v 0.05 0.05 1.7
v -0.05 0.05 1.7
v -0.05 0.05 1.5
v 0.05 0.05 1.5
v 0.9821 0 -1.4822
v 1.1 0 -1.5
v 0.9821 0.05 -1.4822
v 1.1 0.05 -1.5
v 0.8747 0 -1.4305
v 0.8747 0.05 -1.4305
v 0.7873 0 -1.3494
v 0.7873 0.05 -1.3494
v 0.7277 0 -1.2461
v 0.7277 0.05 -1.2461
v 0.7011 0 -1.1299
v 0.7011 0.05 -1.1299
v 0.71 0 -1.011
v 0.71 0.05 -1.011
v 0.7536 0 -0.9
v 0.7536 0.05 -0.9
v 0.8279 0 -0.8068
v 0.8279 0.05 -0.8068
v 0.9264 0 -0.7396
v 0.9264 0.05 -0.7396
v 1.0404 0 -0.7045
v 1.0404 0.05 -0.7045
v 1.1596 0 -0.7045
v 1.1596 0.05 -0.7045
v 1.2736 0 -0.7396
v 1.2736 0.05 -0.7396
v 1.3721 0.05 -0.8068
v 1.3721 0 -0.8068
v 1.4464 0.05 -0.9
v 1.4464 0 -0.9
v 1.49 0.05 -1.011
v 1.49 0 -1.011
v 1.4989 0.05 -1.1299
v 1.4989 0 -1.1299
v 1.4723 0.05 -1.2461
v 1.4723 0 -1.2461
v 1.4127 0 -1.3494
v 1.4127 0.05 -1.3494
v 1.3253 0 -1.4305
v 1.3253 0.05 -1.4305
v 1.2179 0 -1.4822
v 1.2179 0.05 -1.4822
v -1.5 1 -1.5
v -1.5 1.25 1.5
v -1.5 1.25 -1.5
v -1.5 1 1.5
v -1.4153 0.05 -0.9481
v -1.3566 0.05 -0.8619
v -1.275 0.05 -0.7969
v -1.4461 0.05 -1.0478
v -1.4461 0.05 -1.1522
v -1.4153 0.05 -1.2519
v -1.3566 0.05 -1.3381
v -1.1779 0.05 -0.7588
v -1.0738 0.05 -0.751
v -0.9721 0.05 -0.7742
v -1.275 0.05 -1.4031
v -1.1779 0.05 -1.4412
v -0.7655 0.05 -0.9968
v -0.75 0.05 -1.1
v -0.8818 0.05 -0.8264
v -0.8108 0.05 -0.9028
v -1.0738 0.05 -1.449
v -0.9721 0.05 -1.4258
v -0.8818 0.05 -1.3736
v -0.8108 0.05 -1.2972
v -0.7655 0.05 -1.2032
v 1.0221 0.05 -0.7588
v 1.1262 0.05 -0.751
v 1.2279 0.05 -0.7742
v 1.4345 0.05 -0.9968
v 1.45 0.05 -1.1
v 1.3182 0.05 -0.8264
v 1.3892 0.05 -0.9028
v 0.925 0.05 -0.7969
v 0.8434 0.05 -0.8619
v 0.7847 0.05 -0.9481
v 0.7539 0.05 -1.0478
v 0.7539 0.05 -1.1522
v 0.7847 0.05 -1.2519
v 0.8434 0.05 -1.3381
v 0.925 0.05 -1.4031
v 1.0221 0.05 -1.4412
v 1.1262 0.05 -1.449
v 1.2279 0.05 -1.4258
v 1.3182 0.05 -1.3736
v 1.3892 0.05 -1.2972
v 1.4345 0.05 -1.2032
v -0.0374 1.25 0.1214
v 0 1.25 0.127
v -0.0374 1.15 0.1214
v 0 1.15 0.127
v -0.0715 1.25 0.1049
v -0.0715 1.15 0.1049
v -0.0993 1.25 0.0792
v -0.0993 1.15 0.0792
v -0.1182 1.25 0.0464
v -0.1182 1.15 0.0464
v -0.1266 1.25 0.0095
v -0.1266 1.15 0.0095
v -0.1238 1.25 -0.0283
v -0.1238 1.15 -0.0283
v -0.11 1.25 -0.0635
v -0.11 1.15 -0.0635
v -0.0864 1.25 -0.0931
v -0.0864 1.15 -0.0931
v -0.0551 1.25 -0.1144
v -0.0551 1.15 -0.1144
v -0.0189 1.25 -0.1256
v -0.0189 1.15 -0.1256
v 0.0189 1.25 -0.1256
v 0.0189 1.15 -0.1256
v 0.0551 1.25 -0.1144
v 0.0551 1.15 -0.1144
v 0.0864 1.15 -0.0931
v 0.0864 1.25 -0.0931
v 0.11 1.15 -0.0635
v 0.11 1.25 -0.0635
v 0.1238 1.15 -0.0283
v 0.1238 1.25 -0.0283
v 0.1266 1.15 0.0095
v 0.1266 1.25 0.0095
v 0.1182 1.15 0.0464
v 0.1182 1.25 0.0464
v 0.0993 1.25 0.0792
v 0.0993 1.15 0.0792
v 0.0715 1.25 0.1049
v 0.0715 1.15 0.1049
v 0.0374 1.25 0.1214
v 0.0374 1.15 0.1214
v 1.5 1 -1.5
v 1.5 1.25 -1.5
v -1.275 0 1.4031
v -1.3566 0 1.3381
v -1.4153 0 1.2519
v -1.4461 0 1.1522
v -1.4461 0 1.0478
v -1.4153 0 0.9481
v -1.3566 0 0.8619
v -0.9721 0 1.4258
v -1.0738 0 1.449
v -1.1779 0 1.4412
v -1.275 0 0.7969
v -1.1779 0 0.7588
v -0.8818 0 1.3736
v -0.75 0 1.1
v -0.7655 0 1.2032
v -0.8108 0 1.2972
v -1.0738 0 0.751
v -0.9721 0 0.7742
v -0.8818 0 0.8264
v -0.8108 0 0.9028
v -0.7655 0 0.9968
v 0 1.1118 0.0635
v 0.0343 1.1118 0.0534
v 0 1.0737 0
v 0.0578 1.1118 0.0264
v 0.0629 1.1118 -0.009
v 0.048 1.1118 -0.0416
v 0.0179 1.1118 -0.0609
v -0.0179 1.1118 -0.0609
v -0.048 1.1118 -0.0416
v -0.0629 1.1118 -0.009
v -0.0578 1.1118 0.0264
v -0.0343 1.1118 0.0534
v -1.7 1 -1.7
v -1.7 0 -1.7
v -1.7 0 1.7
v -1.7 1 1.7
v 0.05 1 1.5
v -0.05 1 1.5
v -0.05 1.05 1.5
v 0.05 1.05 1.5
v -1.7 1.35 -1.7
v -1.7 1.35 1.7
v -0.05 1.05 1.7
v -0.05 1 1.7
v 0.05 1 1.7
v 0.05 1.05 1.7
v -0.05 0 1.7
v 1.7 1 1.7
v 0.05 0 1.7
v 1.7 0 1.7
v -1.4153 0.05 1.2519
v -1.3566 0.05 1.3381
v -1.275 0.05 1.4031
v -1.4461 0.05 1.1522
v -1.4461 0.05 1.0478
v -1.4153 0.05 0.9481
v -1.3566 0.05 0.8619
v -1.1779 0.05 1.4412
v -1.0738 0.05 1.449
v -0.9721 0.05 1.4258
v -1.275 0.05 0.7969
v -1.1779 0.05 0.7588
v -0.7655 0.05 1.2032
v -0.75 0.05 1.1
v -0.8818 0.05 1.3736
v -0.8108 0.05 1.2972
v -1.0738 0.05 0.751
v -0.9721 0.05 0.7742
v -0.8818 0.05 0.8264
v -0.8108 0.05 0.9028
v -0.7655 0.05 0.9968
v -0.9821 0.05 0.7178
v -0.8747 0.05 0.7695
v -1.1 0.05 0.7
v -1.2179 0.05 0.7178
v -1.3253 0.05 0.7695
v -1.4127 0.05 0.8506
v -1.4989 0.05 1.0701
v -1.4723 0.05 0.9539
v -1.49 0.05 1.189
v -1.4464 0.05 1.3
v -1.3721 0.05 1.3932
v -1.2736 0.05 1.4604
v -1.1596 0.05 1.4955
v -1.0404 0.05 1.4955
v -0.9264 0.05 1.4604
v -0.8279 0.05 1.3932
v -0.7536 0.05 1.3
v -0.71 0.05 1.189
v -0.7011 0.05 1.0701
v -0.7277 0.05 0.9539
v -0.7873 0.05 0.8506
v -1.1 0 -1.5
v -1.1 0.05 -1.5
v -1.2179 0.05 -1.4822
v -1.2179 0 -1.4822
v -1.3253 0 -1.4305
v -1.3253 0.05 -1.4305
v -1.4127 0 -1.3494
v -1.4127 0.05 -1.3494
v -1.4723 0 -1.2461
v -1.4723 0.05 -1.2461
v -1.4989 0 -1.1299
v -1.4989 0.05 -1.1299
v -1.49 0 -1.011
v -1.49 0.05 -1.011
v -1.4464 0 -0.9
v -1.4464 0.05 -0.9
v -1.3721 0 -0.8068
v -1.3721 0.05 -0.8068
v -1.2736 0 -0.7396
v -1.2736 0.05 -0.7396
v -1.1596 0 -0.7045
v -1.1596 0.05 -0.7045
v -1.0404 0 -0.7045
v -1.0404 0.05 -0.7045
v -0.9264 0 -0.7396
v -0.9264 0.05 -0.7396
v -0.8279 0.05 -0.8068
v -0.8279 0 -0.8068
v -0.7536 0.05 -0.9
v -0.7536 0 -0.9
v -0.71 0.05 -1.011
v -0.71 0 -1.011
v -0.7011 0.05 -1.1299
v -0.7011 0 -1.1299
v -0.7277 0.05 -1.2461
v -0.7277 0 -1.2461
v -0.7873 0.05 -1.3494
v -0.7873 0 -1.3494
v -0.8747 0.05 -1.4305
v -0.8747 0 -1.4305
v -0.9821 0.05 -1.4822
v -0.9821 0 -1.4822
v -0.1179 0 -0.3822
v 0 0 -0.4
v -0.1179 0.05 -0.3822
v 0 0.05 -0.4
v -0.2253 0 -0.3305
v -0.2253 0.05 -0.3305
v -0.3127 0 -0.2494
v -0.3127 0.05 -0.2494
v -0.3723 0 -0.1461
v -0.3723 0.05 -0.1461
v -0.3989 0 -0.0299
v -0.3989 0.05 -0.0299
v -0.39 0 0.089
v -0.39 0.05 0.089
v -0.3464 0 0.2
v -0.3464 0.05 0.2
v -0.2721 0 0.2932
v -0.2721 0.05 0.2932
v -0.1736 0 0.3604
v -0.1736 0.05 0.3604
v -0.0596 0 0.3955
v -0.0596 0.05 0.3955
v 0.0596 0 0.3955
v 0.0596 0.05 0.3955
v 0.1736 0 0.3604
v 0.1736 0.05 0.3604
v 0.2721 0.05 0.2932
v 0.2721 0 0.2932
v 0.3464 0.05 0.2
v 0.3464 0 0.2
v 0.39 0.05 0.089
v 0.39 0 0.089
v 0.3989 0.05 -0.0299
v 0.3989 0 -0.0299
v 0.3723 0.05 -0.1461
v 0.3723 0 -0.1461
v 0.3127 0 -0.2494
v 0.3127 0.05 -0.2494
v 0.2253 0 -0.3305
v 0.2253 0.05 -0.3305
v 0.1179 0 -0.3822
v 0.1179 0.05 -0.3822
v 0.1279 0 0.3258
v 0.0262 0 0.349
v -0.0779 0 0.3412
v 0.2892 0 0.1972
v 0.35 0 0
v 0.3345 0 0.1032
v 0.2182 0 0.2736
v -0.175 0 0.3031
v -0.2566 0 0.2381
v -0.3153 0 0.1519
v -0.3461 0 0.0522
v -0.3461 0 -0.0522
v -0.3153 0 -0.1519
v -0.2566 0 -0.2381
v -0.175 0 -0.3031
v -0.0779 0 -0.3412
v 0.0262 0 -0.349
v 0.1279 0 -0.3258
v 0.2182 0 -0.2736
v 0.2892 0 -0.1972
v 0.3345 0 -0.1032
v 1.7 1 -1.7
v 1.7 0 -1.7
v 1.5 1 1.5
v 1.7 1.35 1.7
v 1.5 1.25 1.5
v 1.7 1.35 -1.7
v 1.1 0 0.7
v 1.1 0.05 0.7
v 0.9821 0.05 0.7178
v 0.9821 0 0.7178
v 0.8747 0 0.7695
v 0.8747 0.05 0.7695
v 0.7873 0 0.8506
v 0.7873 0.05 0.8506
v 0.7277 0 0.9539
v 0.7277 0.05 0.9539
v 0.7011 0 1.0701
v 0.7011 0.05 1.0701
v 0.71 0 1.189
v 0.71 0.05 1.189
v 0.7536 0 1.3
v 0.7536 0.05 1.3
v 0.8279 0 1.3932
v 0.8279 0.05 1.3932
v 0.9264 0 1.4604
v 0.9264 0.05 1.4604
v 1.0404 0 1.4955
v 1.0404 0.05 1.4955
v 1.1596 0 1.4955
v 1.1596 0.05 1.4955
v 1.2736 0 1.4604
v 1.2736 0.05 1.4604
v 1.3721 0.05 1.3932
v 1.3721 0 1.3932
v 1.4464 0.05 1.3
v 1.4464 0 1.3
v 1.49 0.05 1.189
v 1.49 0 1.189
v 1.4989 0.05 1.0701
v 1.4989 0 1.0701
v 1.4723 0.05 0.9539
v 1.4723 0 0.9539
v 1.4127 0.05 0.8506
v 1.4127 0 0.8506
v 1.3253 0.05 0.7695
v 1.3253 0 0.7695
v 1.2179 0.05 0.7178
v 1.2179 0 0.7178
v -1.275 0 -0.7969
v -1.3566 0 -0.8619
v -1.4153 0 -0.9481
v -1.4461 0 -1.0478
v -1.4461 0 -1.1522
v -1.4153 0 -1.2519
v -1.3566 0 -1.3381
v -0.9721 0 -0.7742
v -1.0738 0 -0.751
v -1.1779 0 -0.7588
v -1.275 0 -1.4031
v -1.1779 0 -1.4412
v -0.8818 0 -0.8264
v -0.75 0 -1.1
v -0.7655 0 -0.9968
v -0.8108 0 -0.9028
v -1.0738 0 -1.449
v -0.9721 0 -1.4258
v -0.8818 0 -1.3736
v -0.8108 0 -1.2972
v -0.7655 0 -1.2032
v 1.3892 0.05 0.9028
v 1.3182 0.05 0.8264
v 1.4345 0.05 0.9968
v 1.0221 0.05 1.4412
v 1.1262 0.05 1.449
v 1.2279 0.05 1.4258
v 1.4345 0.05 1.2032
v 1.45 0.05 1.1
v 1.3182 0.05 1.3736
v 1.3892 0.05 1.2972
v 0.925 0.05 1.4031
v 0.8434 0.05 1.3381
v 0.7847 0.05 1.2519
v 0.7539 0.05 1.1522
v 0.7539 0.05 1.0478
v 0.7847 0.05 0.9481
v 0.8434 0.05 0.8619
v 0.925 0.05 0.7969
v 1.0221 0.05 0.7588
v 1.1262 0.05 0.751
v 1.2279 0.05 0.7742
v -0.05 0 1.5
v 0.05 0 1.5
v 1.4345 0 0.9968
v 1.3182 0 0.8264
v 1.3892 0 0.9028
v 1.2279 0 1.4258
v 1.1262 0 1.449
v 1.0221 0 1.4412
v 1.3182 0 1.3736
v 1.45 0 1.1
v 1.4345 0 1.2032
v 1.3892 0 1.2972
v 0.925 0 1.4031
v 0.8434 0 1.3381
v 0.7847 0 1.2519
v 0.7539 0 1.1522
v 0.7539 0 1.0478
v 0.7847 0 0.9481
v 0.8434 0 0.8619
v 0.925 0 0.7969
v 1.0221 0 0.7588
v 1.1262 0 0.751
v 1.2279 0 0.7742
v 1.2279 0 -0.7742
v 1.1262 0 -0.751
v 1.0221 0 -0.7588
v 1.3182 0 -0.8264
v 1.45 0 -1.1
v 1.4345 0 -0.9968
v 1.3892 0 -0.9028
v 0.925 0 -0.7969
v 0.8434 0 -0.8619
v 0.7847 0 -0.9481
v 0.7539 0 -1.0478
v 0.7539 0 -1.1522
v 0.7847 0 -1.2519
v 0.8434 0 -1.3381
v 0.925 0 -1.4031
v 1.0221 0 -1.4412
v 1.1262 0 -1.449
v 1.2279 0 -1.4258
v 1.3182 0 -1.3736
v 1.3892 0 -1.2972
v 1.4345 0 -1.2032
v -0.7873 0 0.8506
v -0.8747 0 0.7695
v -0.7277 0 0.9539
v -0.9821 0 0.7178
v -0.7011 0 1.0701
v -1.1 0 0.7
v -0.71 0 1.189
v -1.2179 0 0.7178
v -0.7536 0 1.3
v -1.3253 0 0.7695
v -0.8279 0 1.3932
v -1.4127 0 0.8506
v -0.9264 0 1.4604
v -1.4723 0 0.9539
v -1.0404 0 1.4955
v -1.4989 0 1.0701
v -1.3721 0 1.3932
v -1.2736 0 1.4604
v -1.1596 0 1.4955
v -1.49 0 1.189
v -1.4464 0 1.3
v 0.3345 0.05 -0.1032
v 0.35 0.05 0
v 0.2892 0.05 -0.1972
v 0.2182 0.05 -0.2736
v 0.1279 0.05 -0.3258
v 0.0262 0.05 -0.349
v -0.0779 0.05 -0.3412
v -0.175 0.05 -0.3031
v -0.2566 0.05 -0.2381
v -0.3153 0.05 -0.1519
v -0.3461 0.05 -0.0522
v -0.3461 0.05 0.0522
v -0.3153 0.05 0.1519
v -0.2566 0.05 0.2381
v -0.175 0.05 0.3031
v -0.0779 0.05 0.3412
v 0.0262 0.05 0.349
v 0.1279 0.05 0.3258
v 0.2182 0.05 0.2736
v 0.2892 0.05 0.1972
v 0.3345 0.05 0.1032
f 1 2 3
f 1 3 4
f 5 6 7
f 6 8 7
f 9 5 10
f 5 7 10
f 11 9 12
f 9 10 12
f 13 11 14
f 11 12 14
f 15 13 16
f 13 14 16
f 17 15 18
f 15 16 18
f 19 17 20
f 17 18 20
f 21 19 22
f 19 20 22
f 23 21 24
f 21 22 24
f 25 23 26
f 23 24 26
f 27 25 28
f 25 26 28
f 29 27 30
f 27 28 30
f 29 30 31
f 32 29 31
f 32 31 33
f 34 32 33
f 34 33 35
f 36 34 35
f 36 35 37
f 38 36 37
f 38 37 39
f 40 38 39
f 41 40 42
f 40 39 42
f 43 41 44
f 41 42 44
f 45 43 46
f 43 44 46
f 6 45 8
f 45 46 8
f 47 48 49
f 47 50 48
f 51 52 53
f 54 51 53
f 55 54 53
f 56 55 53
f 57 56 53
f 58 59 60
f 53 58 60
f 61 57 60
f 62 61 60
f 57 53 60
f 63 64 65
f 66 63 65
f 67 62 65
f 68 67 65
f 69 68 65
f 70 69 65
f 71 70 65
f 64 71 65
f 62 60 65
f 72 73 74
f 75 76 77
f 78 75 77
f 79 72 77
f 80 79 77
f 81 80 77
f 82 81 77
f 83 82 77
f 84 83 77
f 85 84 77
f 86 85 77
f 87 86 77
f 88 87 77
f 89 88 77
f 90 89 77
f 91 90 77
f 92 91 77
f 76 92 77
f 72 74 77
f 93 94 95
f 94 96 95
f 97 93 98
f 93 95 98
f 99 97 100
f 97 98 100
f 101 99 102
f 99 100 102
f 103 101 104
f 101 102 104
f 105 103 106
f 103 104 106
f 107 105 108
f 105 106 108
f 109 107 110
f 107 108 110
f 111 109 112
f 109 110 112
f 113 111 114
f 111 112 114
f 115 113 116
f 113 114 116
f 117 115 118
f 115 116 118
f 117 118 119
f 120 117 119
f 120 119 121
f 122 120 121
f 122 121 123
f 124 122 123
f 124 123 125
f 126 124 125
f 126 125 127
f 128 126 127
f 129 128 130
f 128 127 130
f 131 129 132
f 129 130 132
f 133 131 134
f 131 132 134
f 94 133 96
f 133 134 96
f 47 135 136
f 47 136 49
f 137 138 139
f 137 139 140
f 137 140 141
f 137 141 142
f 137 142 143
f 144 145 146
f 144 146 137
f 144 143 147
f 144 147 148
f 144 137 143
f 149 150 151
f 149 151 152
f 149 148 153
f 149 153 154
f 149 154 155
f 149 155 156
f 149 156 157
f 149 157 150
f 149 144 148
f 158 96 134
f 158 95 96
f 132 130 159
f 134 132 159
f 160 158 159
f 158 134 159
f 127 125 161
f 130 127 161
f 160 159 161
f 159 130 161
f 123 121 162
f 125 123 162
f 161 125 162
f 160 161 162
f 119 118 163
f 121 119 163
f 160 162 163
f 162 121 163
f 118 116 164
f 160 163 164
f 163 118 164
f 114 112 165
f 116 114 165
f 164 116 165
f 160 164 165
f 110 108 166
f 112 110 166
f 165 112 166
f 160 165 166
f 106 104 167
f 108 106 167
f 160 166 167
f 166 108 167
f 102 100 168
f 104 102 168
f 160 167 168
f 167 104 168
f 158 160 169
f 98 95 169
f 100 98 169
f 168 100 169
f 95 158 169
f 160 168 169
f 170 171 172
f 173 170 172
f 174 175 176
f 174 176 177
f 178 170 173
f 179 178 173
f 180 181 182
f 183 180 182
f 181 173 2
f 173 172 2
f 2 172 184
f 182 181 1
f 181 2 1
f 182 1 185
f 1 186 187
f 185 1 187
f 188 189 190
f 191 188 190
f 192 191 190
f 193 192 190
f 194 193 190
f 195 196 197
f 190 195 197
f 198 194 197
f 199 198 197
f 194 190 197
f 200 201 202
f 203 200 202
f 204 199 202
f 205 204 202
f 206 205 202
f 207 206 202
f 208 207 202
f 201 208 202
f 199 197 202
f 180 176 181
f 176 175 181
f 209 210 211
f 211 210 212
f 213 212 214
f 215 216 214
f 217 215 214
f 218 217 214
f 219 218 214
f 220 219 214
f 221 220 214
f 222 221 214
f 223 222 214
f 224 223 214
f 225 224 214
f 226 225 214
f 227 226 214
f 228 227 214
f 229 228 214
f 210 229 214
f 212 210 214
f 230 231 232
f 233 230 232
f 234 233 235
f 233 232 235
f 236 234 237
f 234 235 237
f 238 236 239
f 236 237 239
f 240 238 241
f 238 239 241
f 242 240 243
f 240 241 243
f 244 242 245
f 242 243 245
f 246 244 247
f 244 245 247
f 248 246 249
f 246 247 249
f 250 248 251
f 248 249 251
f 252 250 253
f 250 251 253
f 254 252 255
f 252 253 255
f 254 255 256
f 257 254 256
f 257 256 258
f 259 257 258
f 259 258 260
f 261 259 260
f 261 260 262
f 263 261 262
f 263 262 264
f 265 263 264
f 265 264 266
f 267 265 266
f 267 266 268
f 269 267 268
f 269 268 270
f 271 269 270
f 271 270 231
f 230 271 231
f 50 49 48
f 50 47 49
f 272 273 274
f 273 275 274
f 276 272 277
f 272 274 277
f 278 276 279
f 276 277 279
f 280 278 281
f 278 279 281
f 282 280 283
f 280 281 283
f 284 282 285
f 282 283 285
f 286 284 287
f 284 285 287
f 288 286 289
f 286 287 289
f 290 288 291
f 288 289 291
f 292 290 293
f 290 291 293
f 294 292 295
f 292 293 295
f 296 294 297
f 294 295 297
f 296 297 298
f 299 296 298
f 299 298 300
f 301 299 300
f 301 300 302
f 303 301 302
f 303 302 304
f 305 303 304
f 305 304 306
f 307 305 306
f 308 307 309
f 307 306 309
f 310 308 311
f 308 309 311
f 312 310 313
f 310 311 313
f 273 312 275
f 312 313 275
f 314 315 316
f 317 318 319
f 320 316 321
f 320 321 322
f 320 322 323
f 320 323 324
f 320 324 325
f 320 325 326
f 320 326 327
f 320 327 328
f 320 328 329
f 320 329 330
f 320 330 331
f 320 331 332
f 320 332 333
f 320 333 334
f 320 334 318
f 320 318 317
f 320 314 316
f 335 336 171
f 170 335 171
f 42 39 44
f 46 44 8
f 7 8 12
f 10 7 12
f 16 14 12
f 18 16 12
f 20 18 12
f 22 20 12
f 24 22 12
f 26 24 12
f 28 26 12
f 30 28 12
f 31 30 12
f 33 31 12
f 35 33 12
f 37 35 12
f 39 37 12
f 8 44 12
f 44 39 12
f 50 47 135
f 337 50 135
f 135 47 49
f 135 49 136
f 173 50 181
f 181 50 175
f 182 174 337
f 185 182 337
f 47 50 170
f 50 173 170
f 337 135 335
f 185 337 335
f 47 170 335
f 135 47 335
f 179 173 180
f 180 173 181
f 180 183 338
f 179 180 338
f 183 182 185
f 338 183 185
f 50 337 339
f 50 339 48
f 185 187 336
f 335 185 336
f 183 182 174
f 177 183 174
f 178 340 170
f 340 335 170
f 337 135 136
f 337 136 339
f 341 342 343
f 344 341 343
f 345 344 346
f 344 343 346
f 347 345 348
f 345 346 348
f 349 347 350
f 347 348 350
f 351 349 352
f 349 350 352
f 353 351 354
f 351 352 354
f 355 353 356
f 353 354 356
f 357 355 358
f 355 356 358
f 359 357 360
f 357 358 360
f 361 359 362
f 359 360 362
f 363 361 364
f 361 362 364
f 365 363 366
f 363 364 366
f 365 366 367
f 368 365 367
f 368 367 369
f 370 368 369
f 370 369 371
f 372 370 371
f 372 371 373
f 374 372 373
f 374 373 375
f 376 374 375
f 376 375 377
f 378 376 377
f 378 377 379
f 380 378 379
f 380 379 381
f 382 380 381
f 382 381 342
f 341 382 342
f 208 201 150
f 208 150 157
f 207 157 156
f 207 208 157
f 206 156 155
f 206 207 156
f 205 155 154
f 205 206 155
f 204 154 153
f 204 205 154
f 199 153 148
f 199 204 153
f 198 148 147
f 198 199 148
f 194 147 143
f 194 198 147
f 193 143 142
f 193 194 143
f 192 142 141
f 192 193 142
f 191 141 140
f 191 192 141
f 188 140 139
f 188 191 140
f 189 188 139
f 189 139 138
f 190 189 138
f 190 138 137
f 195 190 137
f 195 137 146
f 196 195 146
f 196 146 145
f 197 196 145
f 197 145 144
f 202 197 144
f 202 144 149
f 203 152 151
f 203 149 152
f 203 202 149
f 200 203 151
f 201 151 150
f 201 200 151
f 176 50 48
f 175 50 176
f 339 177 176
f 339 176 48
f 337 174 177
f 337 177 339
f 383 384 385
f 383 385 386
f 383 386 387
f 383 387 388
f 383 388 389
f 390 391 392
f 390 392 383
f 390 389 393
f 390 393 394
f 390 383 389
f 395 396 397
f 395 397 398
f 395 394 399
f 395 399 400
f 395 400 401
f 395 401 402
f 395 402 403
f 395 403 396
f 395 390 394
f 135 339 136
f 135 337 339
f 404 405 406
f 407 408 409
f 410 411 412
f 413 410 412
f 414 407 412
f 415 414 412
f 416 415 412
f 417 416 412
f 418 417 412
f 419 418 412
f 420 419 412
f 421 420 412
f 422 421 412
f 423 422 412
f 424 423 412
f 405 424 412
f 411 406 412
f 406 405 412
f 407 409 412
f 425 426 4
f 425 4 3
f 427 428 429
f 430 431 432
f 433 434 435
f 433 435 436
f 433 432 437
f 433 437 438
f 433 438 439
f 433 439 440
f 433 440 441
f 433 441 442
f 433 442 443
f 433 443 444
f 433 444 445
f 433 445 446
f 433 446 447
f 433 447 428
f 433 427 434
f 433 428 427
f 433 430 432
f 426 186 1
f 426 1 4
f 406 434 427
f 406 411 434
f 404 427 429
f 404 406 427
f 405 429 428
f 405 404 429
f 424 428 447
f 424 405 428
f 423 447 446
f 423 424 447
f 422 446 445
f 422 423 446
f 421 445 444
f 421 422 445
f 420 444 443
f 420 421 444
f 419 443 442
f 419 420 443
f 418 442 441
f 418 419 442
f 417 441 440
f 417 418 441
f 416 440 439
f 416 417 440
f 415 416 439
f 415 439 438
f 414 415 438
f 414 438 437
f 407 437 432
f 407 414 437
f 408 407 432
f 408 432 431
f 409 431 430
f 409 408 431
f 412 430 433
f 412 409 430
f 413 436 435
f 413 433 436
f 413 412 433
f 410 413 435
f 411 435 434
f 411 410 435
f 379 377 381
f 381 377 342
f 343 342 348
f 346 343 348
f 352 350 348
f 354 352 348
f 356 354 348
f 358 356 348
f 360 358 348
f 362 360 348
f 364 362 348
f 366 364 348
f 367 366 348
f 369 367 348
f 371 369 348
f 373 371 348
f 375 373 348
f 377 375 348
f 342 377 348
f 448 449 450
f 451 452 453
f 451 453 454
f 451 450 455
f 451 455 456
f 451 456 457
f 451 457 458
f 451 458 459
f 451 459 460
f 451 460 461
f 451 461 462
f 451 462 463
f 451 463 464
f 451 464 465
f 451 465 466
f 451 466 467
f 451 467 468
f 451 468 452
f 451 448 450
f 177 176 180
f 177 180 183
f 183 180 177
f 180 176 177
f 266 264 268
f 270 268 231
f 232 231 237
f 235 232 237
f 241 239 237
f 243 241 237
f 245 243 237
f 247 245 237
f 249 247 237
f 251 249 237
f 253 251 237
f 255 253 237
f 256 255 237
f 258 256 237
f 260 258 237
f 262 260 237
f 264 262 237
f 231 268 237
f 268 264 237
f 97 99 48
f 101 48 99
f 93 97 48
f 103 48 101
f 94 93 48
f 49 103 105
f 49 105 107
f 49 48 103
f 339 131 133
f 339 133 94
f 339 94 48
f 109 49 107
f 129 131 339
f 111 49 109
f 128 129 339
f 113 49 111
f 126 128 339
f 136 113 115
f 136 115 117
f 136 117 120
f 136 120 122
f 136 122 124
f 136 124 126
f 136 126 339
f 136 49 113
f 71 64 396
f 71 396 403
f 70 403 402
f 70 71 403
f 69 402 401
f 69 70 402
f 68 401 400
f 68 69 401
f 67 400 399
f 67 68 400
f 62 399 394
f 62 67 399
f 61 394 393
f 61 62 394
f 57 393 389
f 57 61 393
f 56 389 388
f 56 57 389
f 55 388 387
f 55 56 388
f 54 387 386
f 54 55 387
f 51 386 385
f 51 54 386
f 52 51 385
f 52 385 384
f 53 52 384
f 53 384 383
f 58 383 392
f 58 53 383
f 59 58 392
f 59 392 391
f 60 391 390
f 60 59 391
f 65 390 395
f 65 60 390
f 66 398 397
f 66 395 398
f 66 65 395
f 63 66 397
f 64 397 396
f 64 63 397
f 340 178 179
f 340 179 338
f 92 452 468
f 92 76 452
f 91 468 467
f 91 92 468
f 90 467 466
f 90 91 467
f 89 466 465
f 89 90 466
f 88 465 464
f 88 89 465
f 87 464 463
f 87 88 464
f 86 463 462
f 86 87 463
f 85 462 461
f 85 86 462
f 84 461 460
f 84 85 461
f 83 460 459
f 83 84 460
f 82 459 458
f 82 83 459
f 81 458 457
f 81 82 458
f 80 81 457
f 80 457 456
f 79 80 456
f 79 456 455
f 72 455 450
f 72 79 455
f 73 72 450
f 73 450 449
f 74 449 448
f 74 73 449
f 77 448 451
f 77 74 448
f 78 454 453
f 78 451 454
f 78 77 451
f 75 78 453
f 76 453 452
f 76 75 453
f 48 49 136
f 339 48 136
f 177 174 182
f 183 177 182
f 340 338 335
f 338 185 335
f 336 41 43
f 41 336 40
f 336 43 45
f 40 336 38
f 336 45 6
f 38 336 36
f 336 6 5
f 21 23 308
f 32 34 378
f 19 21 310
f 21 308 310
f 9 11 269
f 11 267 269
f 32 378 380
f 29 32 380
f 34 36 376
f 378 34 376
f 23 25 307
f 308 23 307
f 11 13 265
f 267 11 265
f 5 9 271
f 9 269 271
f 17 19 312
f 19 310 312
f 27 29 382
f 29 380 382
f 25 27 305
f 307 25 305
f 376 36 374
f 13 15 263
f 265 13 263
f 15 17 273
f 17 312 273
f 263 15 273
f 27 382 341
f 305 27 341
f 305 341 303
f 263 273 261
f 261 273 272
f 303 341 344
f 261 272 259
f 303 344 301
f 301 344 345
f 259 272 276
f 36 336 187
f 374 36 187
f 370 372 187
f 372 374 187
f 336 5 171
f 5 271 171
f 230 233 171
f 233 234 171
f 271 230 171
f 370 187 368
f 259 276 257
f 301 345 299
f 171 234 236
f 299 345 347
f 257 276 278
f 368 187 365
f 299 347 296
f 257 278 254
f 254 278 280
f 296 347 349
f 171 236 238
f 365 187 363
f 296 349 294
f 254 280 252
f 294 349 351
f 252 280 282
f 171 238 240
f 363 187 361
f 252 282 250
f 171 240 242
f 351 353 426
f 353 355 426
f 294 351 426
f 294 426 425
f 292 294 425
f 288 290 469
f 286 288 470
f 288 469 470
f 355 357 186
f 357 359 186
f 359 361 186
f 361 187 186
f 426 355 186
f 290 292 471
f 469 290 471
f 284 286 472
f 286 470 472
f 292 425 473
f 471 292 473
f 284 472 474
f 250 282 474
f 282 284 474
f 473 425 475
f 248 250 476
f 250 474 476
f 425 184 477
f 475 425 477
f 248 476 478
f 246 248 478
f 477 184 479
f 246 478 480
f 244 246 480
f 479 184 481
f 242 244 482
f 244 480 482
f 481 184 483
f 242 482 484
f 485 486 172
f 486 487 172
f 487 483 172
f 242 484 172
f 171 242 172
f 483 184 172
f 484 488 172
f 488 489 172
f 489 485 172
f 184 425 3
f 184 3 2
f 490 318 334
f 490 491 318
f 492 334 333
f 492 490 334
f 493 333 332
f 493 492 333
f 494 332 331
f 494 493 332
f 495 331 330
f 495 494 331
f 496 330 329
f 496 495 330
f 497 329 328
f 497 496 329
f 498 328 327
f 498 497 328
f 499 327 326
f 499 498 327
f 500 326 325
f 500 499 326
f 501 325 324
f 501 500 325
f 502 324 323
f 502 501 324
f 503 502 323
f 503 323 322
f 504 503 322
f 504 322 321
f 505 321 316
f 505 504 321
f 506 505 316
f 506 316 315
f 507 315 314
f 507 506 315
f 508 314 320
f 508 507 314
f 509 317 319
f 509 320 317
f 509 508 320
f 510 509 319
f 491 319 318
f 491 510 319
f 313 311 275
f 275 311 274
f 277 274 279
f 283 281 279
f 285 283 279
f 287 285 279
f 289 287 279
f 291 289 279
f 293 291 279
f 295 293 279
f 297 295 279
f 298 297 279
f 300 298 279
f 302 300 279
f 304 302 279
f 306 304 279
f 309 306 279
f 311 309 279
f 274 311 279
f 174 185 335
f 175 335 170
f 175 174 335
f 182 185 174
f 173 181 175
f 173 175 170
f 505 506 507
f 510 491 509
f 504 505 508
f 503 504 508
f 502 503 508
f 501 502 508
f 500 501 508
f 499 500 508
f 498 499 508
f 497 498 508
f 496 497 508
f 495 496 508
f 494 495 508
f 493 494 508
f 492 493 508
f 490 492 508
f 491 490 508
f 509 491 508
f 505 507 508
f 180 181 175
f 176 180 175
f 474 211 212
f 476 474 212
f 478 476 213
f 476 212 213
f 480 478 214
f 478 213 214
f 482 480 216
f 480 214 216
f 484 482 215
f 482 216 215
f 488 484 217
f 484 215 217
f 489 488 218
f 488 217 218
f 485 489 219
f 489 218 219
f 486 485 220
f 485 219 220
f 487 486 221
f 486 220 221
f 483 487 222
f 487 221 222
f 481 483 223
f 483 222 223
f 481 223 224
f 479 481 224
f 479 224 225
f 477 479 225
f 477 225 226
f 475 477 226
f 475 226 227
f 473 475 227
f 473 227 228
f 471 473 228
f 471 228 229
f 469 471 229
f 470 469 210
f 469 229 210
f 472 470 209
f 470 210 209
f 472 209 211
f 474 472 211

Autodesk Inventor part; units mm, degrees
ref_plane "YZ Plane" through (0, 0, 0) normal (1, 0, 0) x (0, 1, 0)
ref_plane "XZ Plane" through (0, 0, 0) normal (0, 1, 0) x (-1, 0, 0)
ref_plane "XY Plane" through (0, 0, 0) normal (0, 0, 1) x (1, 0, 0)
sketch "Sketch1" plane through (0, 0, 0) normal (0, 1, 0) x (-1, 0, 0)
  line L0 (1.7, 1.7) -> (-1.7, 1.7)
  line L1 (-1.7, 1.7) -> (-1.7, -1.7)
  line L2 (-1.7, -1.7) -> (1.7, -1.7)
  line L3 (1.7, -1.7) -> (1.7, 1.7)
  line L4 (1.7, 1.7) -> (-1.7, -1.7) construction
  line L5 (-1.7, 1.7) -> (1.7, -1.7) construction
  point P0 (0, 0)
  dimension "d0" = 3.4
  dimension "d1" = 3.4
extrude "Extrusion1" add sketch "Sketch1" along normal blind 1
sketch "Sketch2" plane through (0, 1, 0) normal (0, 1, 0) x (1, 0, 0)
  line L0 (1.5, -1.5) -> (-1.5, -1.5)
  line L1 (-1.5, -1.5) -> (-1.5, 1.5)
  line L2 (-1.5, 1.5) -> (1.5, 1.5)
  line L3 (1.5, 1.5) -> (1.5, -1.5)
  line L4 (1.5, -1.5) -> (-1.5, 1.5) construction
  line L5 (-1.5, -1.5) -> (1.5, 1.5) construction
  point P0 (0, 0)
  dimension "d4" = 3
  dimension "d5" = 3
extrude "Extrusion2" add sketch "Sketch2" along normal blind 0.25 separate body
sketch "Sketch8" plane through (0, 1, 0) normal (0, 1, 0) x (1, 0, 0)
  line L0 (-1.7, -1.7) -> (1.7, -1.7) projected
  line L1 (1.7, -1.7) -> (1.7, 1.7) projected
  line L2 (1.7, 1.7) -> (-1.7, 1.7) projected
  line L3 (-1.7, 1.7) -> (-1.7, -1.7) projected
  line L4 (-1.5, -1.5) -> (1.5, -1.5) projected
  line L5 (-0.05, -1.7) -> (0.05, -1.7)
  line L6 (0.05, -1.7) -> (0.05, -1.5)
  line L7 (0.05, -1.5) -> (-0.05, -1.5)
  line L8 (-0.05, -1.5) -> (-0.05, -1.7)
  point P0 (0, 0)
  point P1 (0, -1.5)
  dimension "d35" = 0.1
  dimension "d36" = 0.05
extrude "Extrusion6" add sketch "Sketch8" along normal blind 0.05 contours L8 L4 L6 L0 bodies 1
sketch "Sketch3" plane through (0, 1, 0) normal (0, 1, 0) x (1, 0, 0)
  line L0 (-1.7, -1.7) -> (-0.05, -1.7) projected
  line L1 (1.7, -1.7) -> (1.7, 1.7) projected
  line L2 (1.7, 1.7) -> (-1.7, 1.7) projected
  line L3 (-1.7, 1.7) -> (-1.7, -1.7) projected
  line L4 (-1.5, -1.5) -> (1.5, -1.5) projected
  line L5 (1.5, -1.5) -> (1.5, 1.5) projected
  line L6 (1.5, 1.5) -> (-1.5, 1.5) projected
  line L7 (-1.5, 1.5) -> (-1.5, -1.5) projected
  line L8 (0.05, -1.5) -> (0.05, -1.7) projected
  line L9 (0.05, -1.7) -> (1.7, -1.7) projected
  line L10 (-0.05, -1.7) -> (-0.05, -1.5) projected
  line L11 (-0.05, -1.5) -> (0.05, -1.5) projected
  point P0 (0, 0)
extrude "Extrusion3" add sketch "Sketch3" along normal blind 0.35 separate body contours L3 L2 L1 L9 L8 L4 L5 L6 L7 L10 L0
sketch "Sketch9" plane through (0, 1.05, 0) normal (0, 1, 0) x (1, 0, 0)
  point P0 (0, 0)
sketch "Sketch10" plane through (0, 1.35, 0) normal (0, 1, 0) x (1, 0, 0)
  line L0 (-0.05, -1.7) -> (0.05, -1.7) projected
  line L1 (0.05, -1.7) -> (0.05, -1.5) projected
  line L2 (0.05, -1.5) -> (-0.05, -1.5) projected
  line L3 (-0.05, -1.5) -> (-0.05, -1.7) projected
  point P0 (0, 0)
extrude "Extrusion7" add sketch "Sketch10" against normal up to surface (0.3 mm away) bodies 3
sketch "Sketch5" plane through (0, 1.25, 0) normal (0, 1, 0) x (1, 0, 0)
  point P0 (0, 0)
  point P1 (0, 0)
hole "Hole1" at (0, 1.25, 0) direction (0, -1, 0) diameter 0.254 depth 0.1 tip angle 118 bodies 2
sketch "Sketch4" plane through (0, 1.35, 0) normal (0, 1, 0) x (1, 0, 0)
  line L0 (-1.5, -1.5) -> (-1.5, 1.5) projected
  line L1 (-1.5, 1.5) -> (1.5, 1.5) projected
  line L2 (1.5, 1.5) -> (1.5, -1.5) projected
  line L3 (1.5, -1.5) -> (-1.5, -1.5) projected
  line L4 (1.7, -1.7) -> (1.7, 1.7) projected
  line L5 (1.7, 1.7) -> (-1.7, 1.7) projected
  line L6 (-1.7, 1.7) -> (-1.7, -1.7) projected
  line L7 (-1.7, -1.7) -> (1.7, -1.7) projected
  point P0 (0, 0)
extrude "Extrusion4" add sketch "Sketch4" against normal up to surface (0.1 mm away) contours L0 L1 L2 L3 bodies 3
sketch "Sketch6" plane through (0, 0, 0) normal (0, -1, 0) x (1, 0, 0)
  circle A0 centre (0, 0) radius 0.127 projected
  line L0 (1.1, 1.1) -> (-1.1, 1.1)
  line L1 (-1.1, 1.1) -> (-1.1, -1.1)
  line L2 (-1.1, -1.1) -> (1.1, -1.1)
  line L3 (1.1, -1.1) -> (1.1, 1.1)
  line L4 (1.1, 1.1) -> (-1.1, -1.1) construction
  line L5 (-1.1, 1.1) -> (1.1, -1.1) construction
  dimension "d19" = 2.2
  dimension "d20" = 2.2
hole "Hole2" at (0, 0, 0) at (1.1, 0, -1.1) at (-1.1, 0, -1.1) at (-1.1, 0, 1.1) at (1.1, 0, 1.1) direction (0, 1, 0) diameter 0.8 depth 0.05 bodies 1
sketch "Sketch7" plane through (0, 0.05, 0) normal (0, -1, 0) x (1, 0, 0)
  circle A0 centre (0, 0) radius 0.4 projected
  circle A1 centre (1.1, -1.1) radius 0.4 projected
  circle A2 centre (-1.1, -1.1) radius 0.4 projected
  circle A3 centre (-1.1, 1.1) radius 0.4 projected
  circle A4 centre (1.1, 1.1) radius 0.4 projected
  circle A5 centre (1.1, -1.1) radius 0.35
  circle A6 centre (-1.1, -1.1) radius 0.4 projected
  circle A7 centre (-1.1, -1.1) radius 0.35
  circle A8 centre (-1.1, 1.1) radius 0.35
  circle A9 centre (1.1, 1.1) radius 0.35
  circle A10 centre (0, 0) radius 0.35
  dimension "d28" = 0.7
  dimension "d29" = 0.7
  dimension "d30" = 0.7
  dimension "d31" = 0.7
  dimension "d32" = 0.7
extrude "Extrusion5" add sketch "Sketch7" along normal blind 0.05 separate body contours A5 | A7 | A8 | A9 | A10
sketch "Sketch11" plane through (0, 0, 0) normal (0, -1, 0) x (1, 0, 0)
  circle A0 centre (-1.1, 1.1) radius 0.4 projected
  circle A1 centre (1.1, -1.1) radius 0.4 projected
  circle A2 centre (0, 0) radius 0.4 projected
  circle A3 centre (-1.1, -1.1) radius 0.4 projected
  circle A4 centre (1.1, 1.1) radius 0.4 projected
  line L0 (-1.7, 1.7) -> (1.7, 1.7) projected
  line L1 (-1.7, -1.7) -> (-1.7, 1.7) projected
  line L2 (1.7, -1.7) -> (-1.7, -1.7) projected
  line L3 (1.7, 1.7) -> (1.7, -1.7) projected
  line L4 (-0.05, 1.7) -> (0.05, 1.7)
  line L5 (0.05, 1.7) -> (0.05, 1.5)
  line L6 (0.05, 1.5) -> (-0.05, 1.5)
  line L7 (-0.05, 1.5) -> (-0.05, 1.7)
  point P0 (0, 1.7)
  dimension "d41" = 0.1
  dimension "d42" = 0.2
  dimension "d43" = 0.05
extrude "Extrusion8" cut sketch "Sketch11" against normal blind 0.05 contours L0 L5 L6 L7 bodies 1
properties part number "13360-30xxVE" material "ABS Plastic"
